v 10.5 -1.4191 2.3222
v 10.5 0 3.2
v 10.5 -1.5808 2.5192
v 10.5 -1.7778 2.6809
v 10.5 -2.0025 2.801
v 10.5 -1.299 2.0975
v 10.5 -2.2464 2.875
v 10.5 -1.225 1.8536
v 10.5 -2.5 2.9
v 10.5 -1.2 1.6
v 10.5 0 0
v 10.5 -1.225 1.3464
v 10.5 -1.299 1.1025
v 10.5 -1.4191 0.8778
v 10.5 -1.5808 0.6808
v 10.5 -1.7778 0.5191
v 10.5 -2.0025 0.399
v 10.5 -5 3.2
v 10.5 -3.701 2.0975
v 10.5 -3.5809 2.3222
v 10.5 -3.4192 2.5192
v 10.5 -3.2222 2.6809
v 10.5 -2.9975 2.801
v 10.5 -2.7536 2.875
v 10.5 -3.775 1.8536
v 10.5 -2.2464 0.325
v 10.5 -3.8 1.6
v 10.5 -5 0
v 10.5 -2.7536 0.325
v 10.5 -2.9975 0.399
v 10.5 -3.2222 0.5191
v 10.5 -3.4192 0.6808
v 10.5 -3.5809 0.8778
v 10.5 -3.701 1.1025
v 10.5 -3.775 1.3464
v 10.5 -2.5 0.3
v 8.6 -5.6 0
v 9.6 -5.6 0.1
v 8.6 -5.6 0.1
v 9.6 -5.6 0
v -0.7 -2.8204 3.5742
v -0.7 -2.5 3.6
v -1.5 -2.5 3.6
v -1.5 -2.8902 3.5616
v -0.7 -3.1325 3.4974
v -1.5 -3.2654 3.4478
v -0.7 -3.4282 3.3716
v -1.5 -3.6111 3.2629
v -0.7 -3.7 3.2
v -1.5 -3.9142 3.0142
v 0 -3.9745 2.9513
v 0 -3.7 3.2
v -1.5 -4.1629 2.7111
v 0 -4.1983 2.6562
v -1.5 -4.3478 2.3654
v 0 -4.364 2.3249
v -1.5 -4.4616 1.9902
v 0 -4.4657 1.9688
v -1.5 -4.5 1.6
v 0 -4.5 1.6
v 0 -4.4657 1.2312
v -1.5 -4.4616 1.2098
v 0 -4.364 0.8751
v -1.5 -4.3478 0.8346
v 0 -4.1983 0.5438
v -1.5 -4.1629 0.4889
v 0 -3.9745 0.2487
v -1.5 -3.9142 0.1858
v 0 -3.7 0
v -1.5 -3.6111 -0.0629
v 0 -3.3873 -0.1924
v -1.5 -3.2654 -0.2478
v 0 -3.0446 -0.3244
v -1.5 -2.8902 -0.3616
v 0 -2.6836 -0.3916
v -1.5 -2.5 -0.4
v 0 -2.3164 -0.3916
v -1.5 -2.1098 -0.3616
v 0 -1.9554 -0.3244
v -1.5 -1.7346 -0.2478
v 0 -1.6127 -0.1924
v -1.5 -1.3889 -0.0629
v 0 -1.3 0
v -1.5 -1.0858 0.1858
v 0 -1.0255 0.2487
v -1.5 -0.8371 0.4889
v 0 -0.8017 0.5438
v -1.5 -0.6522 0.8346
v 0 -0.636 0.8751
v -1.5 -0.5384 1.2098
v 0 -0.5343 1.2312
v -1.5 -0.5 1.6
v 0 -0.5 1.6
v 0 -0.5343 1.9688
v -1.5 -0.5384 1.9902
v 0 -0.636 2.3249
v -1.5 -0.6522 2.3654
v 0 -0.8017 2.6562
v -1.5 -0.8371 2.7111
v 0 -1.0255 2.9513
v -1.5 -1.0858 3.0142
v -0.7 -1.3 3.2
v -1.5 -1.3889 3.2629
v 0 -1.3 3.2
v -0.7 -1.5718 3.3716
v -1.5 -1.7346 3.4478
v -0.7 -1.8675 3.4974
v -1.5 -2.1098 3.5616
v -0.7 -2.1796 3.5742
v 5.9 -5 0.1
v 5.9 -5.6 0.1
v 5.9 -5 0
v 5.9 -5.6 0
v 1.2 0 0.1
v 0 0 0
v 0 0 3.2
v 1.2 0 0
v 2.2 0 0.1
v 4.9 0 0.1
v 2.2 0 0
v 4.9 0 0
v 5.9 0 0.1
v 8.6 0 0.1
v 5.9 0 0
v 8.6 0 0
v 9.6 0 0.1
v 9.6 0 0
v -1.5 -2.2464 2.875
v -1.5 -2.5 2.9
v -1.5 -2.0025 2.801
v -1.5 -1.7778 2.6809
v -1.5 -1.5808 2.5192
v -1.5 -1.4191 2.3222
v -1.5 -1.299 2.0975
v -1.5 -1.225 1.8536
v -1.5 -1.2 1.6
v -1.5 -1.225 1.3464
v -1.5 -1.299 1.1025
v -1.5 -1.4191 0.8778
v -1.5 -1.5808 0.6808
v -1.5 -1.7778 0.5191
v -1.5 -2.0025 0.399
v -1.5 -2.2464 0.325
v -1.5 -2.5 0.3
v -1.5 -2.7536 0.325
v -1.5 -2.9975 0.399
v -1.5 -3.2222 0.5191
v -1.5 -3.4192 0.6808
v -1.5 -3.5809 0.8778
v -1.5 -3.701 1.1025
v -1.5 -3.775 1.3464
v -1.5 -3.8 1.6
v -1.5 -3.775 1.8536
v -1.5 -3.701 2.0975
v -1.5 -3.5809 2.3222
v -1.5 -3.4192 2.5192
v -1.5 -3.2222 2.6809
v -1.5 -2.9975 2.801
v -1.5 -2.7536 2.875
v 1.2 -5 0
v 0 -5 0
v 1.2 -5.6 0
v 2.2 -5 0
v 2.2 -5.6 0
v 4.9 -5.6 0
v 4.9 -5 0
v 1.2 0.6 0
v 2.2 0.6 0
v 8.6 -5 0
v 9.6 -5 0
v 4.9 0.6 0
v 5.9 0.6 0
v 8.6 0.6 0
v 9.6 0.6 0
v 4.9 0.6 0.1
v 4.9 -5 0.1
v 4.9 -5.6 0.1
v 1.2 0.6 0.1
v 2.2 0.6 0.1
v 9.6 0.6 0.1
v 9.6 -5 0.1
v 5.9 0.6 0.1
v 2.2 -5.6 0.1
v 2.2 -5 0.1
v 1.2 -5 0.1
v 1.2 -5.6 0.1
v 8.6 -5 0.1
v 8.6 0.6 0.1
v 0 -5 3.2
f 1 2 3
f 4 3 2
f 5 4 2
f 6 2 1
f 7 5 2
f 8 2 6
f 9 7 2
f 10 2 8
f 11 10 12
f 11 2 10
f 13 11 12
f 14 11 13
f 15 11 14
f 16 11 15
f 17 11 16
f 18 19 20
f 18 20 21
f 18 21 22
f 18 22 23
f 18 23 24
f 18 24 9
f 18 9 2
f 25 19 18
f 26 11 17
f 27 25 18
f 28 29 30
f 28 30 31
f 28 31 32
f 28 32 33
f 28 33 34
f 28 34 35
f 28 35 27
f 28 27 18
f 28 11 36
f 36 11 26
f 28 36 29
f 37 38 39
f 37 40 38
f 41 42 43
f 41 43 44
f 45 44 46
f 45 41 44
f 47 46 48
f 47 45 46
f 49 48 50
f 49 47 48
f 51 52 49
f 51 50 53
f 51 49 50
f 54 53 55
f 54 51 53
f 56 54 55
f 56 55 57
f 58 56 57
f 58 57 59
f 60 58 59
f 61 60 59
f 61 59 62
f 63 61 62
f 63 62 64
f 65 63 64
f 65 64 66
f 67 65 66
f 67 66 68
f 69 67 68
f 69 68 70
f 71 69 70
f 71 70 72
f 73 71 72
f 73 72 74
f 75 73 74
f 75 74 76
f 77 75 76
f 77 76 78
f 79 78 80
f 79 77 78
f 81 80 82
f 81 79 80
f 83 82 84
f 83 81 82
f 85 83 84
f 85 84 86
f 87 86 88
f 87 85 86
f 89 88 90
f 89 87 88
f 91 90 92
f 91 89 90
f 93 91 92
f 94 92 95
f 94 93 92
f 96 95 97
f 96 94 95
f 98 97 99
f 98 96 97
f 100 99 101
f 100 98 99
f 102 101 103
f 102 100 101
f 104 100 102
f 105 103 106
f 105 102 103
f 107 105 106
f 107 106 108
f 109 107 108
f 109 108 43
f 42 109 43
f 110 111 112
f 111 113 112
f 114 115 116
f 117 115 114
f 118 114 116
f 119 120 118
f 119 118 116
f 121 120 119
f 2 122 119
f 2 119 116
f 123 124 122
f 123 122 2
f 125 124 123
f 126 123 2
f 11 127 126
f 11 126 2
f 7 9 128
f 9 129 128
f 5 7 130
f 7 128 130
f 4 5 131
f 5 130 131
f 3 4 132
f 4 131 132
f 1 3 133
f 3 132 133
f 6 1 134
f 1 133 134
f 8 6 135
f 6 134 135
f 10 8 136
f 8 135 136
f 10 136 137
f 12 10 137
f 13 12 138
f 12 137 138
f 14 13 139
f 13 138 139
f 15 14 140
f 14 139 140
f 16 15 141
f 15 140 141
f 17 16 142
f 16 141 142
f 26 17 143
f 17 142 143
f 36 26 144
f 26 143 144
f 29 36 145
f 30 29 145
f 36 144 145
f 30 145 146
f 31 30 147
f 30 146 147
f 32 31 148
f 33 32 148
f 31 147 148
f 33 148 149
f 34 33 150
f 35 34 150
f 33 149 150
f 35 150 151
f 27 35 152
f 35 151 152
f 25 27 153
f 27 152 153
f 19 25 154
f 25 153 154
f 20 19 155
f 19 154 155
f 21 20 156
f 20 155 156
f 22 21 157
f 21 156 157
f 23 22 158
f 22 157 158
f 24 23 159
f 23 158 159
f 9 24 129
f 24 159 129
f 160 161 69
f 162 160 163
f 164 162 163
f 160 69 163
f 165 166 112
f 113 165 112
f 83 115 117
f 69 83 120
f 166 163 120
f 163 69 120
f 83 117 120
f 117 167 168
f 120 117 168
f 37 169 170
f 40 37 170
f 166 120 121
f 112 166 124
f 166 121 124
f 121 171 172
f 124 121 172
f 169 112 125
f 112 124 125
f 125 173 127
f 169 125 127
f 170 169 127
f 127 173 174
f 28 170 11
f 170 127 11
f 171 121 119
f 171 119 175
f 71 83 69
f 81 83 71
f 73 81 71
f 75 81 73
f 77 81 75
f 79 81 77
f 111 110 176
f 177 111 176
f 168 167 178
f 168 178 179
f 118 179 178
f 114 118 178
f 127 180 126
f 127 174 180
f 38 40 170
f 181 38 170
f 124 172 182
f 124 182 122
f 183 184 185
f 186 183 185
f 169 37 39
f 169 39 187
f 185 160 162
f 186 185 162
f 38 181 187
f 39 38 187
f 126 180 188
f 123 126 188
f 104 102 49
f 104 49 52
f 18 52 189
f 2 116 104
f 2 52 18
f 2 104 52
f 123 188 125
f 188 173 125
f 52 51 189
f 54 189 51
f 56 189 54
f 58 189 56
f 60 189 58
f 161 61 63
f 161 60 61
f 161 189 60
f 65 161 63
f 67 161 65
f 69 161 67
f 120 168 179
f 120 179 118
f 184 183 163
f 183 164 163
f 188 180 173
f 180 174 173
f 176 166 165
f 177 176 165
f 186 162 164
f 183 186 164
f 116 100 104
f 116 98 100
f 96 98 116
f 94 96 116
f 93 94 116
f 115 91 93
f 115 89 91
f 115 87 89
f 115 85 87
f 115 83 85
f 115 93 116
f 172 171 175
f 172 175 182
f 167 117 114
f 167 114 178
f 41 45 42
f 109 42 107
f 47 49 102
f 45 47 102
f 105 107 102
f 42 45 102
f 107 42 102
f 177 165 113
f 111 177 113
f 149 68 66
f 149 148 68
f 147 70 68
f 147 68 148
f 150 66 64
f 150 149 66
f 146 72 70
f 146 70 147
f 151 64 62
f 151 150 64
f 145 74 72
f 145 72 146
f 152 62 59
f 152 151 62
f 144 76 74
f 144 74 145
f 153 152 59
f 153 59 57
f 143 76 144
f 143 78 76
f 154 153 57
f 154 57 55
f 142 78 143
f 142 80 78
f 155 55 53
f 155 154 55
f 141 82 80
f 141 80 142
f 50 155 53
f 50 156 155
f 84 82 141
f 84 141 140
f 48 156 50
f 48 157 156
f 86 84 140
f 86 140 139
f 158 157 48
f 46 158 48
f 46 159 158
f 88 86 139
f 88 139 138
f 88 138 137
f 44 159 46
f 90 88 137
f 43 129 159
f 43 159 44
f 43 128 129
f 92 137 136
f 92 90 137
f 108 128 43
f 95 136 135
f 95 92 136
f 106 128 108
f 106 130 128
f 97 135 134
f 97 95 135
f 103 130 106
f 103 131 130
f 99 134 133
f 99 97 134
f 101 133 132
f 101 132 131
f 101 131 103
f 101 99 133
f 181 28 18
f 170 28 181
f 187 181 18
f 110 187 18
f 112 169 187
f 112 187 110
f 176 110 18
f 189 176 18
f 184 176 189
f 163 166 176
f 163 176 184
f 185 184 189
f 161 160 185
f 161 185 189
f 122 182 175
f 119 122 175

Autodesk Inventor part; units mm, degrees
ref_plane "YZ Plane" through (0, 0, 0) normal (1, 0, 0) x (0, 1, 0)
ref_plane "XZ Plane" through (0, 0, 0) normal (0, 1, 0) x (-1, 0, 0)
ref_plane "XY Plane" through (0, 0, 0) normal (0, 0, 1) x (1, 0, 0)
sketch "Sketch1" plane through (0, 0, 0) normal (0, 0, 1) x (1, 0, 0)
  line L0 (0, 0) -> (10.5, 0)
  line L1 (10.5, 0) -> (10.5, -5)
  line L2 (10.5, -5) -> (0, -5)
  line L3 (0, -5) -> (0, 0)
  dimension "d0" = 10.5
  dimension "d1" = 5
extrude "Extrusion1" add sketch "Sketch1" along normal blind 3.2
sketch "Sketch2" plane through (0, -5, 0) normal (-1, 0, 0) x (0, 0, 1)
  line L0 (0, 0) -> (0, 5) projected
  line L1 (0, 2.5) -> (1.6, 2.5)
  circle A0 centre (1.6, 2.5) radius 1.3
  circle A1 centre (1.6, 2.5) radius 2
  point P0 (0, 1.3)
  point P1 (0, 3.7)
  dimension "d4" = 1.6
  dimension "d5" = 2.6
  dimension "d6" = 4
extrude "Extrusion2" add sketch "Sketch2" along normal blind 1.5
extrude "Extrusion3" cut sketch "Sketch2" against normal through all contours A0
move faces "Move1" translate (-0.7, 0, 0) faces at (0, -2.7773, 3.2729)
sketch "Sketch3" plane through (0, 0, 0) normal (0, 0, -1) x (-1, 0, 0)
  line L0 (0, 0) -> (0, -5) projected
  line L1 (0, -5) -> (0, 0)
  line L2 (0, -2.5) -> (-9.1, -2.5)
  line L3 (-9.1, -2.5) -> (-9.1, -5.6)
  line L4 (-9.1, -5.6) -> (-8.6, -5.6)
  line L5 (-9.1, -5.6) -> (-9.6, -5.6)
  line L6 (-9.6, -5.6) -> (-9.6, -5)
  line L7 (0, -5) -> (-10.5, -5) projected
  line L8 (-8.6, -5.6) -> (-8.6, -5)
  line L9 (-9.6, -5) -> (-8.6, -5)
  line L10 (-9.1, -5) -> (-5.4, -5)
  line L11 (-5.4, -5) -> (-4.9, -5)
  line L12 (-4.9, -5) -> (-4.9, -5.6)
  line L13 (-4.9, -5.6) -> (-5.9, -5.6)
  line L14 (-5.9, -5.6) -> (-5.9, -5)
  line L15 (-5.4, -5) -> (-1.7, -5)
  line L16 (-1.7, -5) -> (-1.2, -5)
  line L17 (-1.2, -5) -> (-1.2, -5.6)
  line L18 (-1.2, -5.6) -> (-2.2, -5.6)
  line L19 (-2.2, -5.6) -> (-2.2, -5)
  line L20 (-9.1, 0.6) -> (-8.6, 0.6)
  line L21 (-9.1, 0.6) -> (-9.6, 0.6)
  line L22 (-9.6, 0.6) -> (-9.6, 0)
  line L23 (-8.6, 0.6) -> (-8.6, 0)
  line L24 (-9.6, 0) -> (-8.6, 0)
  line L25 (-9.1, 0) -> (-5.4, 0)
  line L26 (-5.4, 0) -> (-4.9, 0)
  line L27 (-4.9, 0) -> (-4.9, 0.6)
  line L28 (-4.9, 0.6) -> (-5.9, 0.6)
  line L29 (-5.9, 0.6) -> (-5.9, 0)
  line L30 (-5.4, 0) -> (-1.7, 0)
  line L31 (-1.7, 0) -> (-1.2, 0)
  line L32 (-1.2, 0) -> (-1.2, 0.6)
  line L33 (-1.2, 0.6) -> (-2.2, 0.6)
  line L34 (-2.2, 0.6) -> (-2.2, 0)
  point P0 (0, -3.7)
  dimension "d14" = 9.1
  dimension "d15" = 3.1
  dimension "d16" = 0.5
  dimension "d17" = 0.5
  dimension "d18" = 3.7
  dimension "d19" = 0.5
  dimension "d20" = 1
  dimension "d21" = 3.7
  dimension "d22" = 0.5
  dimension "d23" = 1
extrude "Extrusion4" add sketch "Sketch3" against normal blind 0.1 contours L17 L18 L19 L7 | L7 L8 L4 L3 | L3 L5 L6 L7 | L7 L12 L13 L14 | L20 L23 L24 L22 L21 | L29 L28 L27 L26 L25 | L34 L33 L32 L31 L30
properties part number "PJ-242"
